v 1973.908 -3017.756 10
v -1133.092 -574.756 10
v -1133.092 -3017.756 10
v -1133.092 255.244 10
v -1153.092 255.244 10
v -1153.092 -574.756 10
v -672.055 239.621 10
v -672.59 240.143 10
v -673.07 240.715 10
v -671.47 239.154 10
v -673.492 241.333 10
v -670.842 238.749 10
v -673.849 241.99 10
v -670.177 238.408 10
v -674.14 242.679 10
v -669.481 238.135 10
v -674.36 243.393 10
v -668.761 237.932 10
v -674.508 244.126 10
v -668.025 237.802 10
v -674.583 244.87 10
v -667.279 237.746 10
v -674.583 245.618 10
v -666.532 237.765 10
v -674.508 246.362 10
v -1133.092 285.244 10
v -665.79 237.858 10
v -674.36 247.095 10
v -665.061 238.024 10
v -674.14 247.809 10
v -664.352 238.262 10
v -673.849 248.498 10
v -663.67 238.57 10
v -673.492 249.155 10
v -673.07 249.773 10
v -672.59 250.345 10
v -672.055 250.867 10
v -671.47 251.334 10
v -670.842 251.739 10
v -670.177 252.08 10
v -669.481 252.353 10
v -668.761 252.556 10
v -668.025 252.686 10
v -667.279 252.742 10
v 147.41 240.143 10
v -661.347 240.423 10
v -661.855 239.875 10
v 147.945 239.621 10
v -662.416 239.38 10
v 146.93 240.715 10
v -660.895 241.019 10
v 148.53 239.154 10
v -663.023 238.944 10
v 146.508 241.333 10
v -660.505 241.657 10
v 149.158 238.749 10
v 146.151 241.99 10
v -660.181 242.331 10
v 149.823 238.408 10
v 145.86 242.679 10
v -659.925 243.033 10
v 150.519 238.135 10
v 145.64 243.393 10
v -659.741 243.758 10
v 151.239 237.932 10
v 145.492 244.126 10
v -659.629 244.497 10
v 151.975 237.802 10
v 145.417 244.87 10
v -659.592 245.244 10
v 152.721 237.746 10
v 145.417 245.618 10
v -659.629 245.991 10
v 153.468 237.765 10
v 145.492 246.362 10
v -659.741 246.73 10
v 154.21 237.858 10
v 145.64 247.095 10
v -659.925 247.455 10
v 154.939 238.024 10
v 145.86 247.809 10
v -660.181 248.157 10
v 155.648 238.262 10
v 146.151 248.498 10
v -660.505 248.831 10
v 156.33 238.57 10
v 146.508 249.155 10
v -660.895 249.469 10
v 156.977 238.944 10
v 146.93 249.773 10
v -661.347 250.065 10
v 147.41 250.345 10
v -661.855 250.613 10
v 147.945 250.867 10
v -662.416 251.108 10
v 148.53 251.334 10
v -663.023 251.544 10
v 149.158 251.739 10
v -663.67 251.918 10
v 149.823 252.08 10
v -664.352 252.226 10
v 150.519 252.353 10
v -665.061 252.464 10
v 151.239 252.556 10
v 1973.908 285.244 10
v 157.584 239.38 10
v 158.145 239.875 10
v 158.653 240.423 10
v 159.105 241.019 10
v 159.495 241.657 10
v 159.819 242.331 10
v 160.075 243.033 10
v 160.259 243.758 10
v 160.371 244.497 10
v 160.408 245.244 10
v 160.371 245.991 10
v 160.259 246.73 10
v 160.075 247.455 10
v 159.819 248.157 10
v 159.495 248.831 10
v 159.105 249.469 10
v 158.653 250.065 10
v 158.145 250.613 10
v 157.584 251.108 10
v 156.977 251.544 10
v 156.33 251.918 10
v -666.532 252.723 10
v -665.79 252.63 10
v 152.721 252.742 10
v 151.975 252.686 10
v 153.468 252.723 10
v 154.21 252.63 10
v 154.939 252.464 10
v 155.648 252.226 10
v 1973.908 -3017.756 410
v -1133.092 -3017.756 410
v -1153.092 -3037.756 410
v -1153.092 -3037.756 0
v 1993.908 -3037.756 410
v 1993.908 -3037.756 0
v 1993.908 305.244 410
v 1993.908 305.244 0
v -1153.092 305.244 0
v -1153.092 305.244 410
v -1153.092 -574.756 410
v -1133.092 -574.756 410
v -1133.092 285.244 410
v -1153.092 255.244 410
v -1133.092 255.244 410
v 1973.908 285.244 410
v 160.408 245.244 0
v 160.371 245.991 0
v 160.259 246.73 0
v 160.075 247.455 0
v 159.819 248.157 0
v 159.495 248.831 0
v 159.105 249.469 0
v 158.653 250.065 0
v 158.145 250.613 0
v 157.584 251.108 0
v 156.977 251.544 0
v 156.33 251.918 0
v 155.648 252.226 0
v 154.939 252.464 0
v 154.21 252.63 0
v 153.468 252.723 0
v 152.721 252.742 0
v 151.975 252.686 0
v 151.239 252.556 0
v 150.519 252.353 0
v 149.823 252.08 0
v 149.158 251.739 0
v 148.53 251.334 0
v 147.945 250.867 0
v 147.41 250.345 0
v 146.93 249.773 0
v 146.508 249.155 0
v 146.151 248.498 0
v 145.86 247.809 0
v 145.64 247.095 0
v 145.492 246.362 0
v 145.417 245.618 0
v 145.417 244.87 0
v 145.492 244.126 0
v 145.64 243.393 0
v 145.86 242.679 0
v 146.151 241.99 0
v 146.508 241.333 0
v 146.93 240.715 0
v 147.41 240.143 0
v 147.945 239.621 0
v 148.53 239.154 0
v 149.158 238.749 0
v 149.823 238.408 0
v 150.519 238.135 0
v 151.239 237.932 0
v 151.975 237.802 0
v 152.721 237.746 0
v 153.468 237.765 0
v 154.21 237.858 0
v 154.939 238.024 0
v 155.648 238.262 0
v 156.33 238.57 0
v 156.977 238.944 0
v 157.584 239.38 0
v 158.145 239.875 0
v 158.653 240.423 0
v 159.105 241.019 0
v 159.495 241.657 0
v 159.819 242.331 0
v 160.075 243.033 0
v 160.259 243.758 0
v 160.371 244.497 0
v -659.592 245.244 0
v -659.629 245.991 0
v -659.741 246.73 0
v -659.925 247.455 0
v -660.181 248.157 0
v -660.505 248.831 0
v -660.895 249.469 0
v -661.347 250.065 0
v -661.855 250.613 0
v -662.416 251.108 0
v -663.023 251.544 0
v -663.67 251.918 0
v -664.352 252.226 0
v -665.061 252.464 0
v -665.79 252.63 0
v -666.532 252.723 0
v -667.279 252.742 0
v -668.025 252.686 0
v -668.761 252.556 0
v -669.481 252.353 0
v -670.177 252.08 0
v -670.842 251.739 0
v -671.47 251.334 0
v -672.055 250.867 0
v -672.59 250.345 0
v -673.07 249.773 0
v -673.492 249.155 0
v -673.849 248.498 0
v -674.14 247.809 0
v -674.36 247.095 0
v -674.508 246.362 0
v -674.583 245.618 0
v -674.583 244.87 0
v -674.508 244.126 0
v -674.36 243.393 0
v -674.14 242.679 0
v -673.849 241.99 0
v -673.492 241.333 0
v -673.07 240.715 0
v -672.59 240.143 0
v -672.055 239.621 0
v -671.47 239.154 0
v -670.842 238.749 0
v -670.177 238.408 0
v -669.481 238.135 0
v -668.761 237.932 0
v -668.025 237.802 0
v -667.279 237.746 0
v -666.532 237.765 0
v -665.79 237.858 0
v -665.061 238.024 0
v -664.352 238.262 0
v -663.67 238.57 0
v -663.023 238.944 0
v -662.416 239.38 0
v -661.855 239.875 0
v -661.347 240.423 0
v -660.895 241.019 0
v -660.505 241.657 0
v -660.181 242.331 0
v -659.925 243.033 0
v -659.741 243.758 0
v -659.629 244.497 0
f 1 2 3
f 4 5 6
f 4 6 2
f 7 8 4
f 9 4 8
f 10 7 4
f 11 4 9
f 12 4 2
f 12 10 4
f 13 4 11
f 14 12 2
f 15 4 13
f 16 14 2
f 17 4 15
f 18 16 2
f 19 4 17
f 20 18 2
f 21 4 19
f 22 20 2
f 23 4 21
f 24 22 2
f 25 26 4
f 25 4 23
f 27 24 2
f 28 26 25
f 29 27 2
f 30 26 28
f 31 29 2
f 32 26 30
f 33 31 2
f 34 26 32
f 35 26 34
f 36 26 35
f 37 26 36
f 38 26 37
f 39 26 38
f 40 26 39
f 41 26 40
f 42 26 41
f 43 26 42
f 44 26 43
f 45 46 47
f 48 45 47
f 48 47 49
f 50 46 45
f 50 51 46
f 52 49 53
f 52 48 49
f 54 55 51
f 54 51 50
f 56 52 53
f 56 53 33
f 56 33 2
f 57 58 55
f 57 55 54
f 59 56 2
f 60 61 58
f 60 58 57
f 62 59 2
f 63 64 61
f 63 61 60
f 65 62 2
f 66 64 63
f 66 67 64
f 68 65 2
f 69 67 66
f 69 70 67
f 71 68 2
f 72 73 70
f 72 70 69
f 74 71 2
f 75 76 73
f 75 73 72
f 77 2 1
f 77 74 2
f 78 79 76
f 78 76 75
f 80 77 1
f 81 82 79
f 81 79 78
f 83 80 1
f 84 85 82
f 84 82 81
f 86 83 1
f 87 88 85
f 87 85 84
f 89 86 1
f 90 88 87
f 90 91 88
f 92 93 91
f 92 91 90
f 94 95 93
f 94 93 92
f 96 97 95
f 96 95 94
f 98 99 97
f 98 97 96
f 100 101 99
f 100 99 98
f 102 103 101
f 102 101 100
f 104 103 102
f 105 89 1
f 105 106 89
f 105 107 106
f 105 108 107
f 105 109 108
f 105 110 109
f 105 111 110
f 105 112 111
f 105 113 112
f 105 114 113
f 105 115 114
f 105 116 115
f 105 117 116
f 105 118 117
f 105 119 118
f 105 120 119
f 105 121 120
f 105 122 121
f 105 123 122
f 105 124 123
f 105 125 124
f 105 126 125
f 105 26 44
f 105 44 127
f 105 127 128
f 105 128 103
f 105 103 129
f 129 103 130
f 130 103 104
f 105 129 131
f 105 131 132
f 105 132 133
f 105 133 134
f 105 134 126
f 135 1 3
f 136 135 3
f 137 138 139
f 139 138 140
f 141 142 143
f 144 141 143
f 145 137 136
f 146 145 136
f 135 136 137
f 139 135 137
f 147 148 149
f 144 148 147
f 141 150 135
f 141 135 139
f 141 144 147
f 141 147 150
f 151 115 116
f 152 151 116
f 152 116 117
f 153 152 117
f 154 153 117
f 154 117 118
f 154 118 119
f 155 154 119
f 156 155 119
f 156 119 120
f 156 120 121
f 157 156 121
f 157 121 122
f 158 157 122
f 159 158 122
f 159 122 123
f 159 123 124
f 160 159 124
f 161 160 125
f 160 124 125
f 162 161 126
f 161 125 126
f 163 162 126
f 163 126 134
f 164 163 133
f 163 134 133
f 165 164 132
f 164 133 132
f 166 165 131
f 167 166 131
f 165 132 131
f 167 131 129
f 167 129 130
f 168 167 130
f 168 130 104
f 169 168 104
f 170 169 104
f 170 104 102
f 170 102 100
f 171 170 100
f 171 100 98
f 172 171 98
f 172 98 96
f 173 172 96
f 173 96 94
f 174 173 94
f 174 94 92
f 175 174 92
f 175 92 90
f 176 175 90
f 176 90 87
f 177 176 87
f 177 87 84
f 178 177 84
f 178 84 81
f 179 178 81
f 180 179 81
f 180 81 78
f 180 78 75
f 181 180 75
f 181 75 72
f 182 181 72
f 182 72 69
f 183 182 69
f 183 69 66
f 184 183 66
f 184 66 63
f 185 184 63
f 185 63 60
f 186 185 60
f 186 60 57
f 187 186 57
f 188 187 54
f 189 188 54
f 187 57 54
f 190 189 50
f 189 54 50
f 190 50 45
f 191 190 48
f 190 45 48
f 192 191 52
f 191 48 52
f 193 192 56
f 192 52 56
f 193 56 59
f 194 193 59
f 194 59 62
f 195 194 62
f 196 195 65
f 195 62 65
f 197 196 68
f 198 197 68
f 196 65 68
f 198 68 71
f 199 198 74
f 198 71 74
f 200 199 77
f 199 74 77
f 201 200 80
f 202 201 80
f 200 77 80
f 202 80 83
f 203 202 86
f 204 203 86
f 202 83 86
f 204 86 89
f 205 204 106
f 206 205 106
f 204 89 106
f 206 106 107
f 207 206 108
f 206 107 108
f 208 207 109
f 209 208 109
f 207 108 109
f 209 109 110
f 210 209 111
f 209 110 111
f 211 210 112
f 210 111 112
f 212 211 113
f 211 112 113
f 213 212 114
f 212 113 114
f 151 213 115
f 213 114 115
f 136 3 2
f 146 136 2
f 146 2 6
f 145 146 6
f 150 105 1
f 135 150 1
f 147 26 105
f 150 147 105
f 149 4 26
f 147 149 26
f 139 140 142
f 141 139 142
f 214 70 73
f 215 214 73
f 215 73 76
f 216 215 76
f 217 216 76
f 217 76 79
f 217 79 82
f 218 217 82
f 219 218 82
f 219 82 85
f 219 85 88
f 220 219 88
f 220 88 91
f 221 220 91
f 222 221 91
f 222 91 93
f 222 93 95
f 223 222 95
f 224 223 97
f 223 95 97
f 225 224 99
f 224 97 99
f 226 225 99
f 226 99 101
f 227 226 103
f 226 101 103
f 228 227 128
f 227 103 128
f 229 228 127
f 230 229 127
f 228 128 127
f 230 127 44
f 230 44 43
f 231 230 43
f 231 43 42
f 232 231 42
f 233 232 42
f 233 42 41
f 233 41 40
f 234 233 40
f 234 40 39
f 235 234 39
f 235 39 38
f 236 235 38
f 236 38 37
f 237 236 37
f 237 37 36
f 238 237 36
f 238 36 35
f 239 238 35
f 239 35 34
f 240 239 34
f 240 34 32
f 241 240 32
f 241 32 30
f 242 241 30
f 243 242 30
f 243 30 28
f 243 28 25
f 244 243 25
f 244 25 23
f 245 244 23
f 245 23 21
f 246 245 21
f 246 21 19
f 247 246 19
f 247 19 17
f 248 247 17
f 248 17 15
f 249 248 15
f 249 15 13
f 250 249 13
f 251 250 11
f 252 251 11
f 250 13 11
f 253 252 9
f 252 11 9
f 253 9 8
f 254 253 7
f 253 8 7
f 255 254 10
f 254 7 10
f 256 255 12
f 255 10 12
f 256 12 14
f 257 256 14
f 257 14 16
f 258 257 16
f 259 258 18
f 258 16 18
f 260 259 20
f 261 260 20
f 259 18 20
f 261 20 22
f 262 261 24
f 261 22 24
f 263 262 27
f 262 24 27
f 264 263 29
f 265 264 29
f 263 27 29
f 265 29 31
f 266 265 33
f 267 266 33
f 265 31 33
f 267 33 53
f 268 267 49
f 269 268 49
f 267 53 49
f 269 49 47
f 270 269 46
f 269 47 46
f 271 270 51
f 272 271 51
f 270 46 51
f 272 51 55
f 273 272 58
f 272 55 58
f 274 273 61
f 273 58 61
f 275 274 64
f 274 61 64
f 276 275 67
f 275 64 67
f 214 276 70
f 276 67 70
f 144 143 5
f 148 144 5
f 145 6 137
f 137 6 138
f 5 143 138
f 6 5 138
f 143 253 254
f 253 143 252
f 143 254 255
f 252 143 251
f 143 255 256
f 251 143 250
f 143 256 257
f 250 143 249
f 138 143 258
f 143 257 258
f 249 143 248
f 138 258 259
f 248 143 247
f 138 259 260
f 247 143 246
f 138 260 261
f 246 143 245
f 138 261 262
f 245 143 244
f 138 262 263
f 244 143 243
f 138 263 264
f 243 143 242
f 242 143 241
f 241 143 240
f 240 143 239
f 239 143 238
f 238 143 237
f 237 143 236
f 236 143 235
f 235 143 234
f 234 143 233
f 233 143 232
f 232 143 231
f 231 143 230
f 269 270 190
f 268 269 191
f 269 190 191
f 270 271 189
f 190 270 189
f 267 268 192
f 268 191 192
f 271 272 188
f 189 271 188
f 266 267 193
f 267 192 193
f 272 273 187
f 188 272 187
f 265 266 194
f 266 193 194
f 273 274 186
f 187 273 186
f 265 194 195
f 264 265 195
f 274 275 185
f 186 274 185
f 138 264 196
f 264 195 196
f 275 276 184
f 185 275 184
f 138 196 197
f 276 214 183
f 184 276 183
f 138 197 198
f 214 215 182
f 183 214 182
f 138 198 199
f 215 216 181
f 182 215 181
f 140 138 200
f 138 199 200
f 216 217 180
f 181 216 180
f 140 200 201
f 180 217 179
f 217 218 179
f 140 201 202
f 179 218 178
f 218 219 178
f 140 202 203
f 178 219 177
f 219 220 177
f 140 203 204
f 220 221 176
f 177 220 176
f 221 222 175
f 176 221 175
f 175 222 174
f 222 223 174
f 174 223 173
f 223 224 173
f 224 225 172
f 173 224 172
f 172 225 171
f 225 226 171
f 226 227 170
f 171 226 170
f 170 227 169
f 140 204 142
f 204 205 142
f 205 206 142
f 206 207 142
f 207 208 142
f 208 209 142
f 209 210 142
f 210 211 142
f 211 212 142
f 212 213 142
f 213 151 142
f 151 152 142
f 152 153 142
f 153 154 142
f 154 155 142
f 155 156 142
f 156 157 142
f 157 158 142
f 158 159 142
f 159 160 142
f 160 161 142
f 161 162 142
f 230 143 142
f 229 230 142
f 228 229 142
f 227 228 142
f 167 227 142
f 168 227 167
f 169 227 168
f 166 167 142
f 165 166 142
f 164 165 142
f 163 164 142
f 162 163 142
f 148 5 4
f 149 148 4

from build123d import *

# Parameters (mm, degrees)
F0_W     = 3147
F0_H     = 3343
F1_DEPTH = 10
F3_DEPTH = 400
F4_R     = 7.5
F5_DEPTH = 25


with BuildPart() as f1:
    # F0 (on Top) → F1 (new body)
    with BuildSketch(Plane.XY):
        with Locations((420.407998, -1366.255973)):
            Rectangle(F0_W, F0_H)
    extrude(amount=F1_DEPTH)

    # F2 (on face) → F3 (join)
    with BuildSketch(Plane.XY.offset(10)):
        Polygon((-1153.092002, 305.244027), (-1153.092002, 255.244027), (-1133.092002, 255.244027), (-1133.092002, 285.244027), (1973.907998, 285.244027), (1973.907998, -3017.755973), (-1133.092002, -3017.755973), (-1133.092002, -574.755973), (-1153.092002, -574.755973), (-1153.092002, -3037.755973), (1993.907998, -3037.755973), (1993.907998, 305.244027), align=None)
    extrude(amount=F3_DEPTH)

    # F4 (on face) → F5 (cut)
    with BuildSketch(Plane.XY.offset(10)):
        with Locations((-667.092002, 245.244027)):
            Circle(F4_R)
        with Locations((152.907998, 245.244027)):
            Circle(F4_R)
    extrude(amount=-F5_DEPTH, mode=Mode.SUBTRACT)


solid = f1.part
